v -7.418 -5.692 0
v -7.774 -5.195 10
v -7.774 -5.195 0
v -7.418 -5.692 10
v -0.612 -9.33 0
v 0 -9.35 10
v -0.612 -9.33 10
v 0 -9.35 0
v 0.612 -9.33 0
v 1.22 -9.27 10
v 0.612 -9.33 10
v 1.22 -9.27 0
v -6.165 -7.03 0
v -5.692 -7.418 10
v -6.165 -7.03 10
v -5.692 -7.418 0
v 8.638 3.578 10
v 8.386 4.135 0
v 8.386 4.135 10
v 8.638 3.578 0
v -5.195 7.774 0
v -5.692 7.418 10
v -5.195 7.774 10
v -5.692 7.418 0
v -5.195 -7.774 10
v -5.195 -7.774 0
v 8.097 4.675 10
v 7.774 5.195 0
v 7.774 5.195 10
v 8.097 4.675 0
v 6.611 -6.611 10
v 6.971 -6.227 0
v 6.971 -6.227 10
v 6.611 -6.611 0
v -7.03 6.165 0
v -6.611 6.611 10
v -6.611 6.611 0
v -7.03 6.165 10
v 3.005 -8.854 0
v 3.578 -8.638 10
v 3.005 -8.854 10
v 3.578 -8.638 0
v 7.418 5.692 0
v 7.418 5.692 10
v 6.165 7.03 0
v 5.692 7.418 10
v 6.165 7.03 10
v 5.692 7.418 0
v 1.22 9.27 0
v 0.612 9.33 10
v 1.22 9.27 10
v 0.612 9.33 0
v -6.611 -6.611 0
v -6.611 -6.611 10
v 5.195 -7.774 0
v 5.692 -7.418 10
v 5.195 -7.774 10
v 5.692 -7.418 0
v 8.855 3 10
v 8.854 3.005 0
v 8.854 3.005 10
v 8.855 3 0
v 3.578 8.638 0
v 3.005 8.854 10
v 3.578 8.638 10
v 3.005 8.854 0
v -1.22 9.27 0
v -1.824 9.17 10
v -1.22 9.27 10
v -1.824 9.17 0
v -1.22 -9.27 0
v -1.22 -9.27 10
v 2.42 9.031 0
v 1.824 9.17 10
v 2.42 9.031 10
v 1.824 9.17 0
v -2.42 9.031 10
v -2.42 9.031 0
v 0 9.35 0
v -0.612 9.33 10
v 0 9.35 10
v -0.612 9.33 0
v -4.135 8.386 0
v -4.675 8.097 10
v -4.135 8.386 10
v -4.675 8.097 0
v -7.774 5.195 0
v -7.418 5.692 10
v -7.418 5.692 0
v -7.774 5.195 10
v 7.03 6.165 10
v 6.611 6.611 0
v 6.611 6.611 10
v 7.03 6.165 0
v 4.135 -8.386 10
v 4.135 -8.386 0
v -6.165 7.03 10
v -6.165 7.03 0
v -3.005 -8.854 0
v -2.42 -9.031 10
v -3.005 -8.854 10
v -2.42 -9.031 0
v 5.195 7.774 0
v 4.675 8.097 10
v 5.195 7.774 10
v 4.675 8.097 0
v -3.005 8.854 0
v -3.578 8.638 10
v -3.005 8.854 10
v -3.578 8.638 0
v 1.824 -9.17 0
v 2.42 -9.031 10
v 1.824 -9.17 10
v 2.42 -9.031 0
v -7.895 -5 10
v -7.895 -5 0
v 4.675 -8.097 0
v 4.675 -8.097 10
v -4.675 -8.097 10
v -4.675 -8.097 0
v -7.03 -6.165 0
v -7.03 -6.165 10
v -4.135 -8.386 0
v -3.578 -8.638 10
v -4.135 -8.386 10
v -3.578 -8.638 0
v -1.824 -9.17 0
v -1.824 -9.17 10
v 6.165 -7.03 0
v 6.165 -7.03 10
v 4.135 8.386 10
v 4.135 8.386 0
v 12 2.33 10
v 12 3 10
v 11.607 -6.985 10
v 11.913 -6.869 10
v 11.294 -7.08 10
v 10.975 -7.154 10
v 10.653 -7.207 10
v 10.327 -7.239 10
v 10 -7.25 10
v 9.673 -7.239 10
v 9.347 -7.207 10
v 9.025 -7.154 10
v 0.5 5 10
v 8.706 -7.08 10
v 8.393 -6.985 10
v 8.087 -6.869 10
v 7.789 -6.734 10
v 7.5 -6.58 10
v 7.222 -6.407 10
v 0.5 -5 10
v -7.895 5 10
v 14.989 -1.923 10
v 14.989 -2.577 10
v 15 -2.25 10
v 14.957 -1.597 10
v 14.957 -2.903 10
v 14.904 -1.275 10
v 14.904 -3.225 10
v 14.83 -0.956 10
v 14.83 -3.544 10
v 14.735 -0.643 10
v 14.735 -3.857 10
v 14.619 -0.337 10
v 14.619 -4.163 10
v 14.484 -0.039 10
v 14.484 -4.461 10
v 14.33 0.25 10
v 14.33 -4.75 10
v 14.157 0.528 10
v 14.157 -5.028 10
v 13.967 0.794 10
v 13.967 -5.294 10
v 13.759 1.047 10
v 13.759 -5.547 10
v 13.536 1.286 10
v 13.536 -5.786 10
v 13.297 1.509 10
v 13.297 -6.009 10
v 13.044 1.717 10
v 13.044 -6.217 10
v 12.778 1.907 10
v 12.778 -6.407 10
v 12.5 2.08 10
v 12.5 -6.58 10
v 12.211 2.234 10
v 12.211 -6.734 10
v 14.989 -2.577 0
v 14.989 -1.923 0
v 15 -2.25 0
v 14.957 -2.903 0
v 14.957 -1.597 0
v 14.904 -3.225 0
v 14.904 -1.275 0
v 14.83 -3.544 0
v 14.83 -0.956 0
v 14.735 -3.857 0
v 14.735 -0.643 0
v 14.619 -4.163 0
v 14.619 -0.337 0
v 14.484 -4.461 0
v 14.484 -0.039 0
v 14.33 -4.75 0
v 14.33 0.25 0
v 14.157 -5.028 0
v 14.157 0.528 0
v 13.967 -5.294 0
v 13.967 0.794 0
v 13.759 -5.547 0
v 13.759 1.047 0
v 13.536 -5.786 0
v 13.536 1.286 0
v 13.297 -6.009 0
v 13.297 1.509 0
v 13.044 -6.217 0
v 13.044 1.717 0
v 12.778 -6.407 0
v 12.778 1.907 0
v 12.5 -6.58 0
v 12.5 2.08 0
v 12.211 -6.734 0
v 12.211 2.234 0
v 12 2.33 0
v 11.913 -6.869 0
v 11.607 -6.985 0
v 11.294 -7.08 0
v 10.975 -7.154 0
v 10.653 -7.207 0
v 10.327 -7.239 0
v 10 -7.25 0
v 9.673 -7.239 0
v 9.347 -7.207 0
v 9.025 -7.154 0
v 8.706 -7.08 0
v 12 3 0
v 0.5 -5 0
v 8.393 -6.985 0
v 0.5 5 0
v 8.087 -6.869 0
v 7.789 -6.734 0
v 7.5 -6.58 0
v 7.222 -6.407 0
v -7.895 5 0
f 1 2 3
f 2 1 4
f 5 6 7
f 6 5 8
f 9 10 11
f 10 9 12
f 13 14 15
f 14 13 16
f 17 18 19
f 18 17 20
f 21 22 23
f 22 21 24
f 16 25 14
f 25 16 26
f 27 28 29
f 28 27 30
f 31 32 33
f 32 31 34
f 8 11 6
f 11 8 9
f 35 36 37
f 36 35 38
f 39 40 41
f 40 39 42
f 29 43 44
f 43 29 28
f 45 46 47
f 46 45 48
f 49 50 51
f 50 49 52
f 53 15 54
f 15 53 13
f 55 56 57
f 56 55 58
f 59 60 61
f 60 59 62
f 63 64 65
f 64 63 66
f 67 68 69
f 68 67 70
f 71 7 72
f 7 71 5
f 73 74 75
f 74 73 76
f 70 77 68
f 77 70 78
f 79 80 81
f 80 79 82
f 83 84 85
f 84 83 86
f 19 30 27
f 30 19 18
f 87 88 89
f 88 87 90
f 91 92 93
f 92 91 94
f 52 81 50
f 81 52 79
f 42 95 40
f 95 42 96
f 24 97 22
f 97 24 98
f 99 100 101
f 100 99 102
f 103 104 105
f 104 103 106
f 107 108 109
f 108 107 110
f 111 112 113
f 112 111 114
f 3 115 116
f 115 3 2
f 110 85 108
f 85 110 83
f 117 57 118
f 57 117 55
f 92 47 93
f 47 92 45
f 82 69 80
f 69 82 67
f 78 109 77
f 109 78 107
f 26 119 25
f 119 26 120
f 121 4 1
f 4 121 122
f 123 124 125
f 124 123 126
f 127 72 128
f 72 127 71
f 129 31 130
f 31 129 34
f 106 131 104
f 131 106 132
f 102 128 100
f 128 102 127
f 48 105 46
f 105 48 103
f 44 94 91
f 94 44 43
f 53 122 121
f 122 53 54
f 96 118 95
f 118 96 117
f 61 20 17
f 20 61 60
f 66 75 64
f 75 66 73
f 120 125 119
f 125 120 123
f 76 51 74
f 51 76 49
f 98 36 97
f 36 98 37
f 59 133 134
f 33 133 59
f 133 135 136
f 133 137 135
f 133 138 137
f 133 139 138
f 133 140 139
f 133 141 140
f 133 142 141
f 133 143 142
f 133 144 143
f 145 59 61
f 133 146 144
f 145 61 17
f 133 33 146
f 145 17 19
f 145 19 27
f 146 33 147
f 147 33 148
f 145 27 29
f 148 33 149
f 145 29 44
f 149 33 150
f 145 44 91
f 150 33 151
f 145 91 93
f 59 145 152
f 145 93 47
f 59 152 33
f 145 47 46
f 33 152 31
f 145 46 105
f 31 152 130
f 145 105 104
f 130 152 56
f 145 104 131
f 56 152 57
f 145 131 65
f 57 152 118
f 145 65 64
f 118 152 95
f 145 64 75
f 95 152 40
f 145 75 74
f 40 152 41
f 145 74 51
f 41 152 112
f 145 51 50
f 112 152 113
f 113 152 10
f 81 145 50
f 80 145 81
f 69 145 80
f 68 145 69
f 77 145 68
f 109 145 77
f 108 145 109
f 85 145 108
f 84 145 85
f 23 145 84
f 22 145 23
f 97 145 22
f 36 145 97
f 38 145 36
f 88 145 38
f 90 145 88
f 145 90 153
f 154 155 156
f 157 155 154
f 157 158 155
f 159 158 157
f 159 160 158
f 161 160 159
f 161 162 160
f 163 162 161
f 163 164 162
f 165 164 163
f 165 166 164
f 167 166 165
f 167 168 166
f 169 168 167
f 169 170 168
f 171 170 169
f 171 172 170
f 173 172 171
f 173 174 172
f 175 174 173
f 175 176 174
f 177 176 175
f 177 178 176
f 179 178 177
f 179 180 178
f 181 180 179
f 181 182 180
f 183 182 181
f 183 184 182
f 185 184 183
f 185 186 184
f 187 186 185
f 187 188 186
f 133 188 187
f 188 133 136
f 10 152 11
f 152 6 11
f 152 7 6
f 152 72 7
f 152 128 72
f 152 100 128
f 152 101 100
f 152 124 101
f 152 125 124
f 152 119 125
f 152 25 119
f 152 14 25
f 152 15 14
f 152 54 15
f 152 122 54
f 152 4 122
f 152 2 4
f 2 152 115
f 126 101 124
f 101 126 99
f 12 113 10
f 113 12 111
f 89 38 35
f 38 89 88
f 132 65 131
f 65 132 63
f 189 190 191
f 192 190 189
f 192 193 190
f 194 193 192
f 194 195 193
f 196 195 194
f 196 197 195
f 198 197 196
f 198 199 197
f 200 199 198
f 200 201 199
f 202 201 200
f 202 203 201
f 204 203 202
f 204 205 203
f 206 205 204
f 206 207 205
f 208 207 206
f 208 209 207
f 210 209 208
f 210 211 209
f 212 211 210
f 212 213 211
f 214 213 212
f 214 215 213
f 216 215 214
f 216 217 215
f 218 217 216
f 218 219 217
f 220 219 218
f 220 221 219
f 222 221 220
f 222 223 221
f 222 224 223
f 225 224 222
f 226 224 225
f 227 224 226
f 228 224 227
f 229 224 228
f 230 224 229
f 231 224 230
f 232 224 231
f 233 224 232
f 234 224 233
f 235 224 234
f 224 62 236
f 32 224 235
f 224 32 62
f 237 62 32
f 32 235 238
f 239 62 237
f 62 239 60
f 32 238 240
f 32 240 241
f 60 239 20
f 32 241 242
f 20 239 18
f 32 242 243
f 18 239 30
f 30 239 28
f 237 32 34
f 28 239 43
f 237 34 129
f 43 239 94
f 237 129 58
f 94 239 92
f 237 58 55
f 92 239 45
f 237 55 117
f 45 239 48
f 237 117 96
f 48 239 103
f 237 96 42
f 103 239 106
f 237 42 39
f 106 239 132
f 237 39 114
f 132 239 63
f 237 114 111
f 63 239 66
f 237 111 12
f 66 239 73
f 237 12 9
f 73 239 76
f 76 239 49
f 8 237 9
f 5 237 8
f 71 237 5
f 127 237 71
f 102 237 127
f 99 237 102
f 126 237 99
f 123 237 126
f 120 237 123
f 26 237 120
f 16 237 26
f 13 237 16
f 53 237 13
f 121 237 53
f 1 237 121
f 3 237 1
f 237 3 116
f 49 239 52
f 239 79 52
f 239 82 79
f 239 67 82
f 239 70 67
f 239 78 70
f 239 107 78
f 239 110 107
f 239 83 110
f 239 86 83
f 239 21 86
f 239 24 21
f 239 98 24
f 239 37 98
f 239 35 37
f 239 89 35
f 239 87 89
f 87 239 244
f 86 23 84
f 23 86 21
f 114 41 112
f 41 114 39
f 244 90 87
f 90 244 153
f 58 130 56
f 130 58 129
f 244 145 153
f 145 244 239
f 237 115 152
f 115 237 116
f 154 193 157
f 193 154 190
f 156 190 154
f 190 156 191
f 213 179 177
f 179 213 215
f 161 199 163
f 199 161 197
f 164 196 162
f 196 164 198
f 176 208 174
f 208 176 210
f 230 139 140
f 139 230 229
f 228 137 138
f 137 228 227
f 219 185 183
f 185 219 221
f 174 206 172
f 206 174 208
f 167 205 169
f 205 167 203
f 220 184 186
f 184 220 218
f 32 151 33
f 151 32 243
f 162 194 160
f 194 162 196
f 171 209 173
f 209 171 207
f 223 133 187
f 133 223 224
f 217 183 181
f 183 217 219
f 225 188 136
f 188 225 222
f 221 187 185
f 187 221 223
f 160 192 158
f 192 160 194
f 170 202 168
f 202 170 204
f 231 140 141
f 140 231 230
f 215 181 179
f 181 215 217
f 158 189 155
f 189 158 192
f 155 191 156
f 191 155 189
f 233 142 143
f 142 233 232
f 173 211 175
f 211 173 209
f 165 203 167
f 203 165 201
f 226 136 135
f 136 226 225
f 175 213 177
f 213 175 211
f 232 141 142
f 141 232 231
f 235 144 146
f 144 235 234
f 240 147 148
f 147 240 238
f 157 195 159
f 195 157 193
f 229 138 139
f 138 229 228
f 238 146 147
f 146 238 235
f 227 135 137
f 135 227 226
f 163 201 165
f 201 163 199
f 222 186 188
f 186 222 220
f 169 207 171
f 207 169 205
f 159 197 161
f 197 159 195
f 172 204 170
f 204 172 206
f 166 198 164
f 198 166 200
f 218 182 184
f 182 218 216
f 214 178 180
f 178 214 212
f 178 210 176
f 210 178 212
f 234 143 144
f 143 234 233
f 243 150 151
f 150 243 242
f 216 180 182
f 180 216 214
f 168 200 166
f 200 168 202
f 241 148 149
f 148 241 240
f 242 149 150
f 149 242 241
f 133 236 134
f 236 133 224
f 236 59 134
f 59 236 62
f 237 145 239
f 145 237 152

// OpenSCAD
// Snap-on tubing clip for a 12.7 mm (1/2 inch) lab stand rod
// Printed flat: extrusion of 10 mm (Z) of a 2-D profile in XY
// Units: mm

$fn = 96;

// ---- Rod ring ----
rod_id     = 12.7;   // rod inner diameter
rod_wall   = 3;      // ring wall thickness
rod_od     = rod_id + 2 * rod_wall;  // 18.7 mm outer diameter
rod_h      = 10;     // extrusion height (Z)
rod_open   = 10;     // opening width cut from -X side
rod_ylim   = rod_open / 2;  // -5 < y < 5 for the cut

// ---- Tubing ring ----
tube_id    = 6;      // tubing inner diameter
tube_wall  = 2;      // ring wall thickness
tube_od    = tube_id + 2 * tube_wall; // 10 mm outer diameter
tube_h     = rod_h;  // same extrusion height
tube_open  = 4.5;    // opening width cut from +X side
tube_x     = 15;     // ring centre X
tube_ylim  = tube_open / 2;  // -2.25 < y < 2.25

// ---- Bridge ----
bridge_w   = 6;      // bridge width in Y
bridge_x0  = 8;      // bridge start X
bridge_x1  = 12;     // bridge end X

// ---- Cutting overlap ----
eps        = 0.5;    // extension past cut faces to avoid coplanar faces

difference() {
    union() {
        // Rod ring
        cylinder(d = rod_od, h = rod_h);
        translate([-rod_od / 2, -rod_ylim, 0])
            cube([rod_od / 2 + eps, 2 * rod_ylim, rod_h]);

        // Tubing ring
        translate([tube_x - tube_od / 2, -tube_ylim, 0])
            cylinder(d = tube_od, h = tube_h);
        translate([tube_x - tube_od / 2 + eps, -tube_ylim, 0])
            cube([eps, 2 * tube_ylim, tube_h]);

        // Solid bridge between the rings
        translate([bridge_x0, -bridge_w / 2, 0])
            cube([bridge_x1 - bridge_x0, bridge_w, rod_h]);
    }

    // Rod ring opening (x < 0 and -5 < y < 5)
    translate([-rod_od / 2, -rod_ylim, -eps])
        cube([rod_od / 2 + eps, 2 * rod_ylim, rod_h + 2 * eps]);

    // Tubing ring opening (x > 15 and -2.25 < y < 2.25)
    translate([tube_x, -tube_ylim, -eps])
        cube([eps + rod_h, 2 * tube_ylim, rod_h + 2 * eps]);
}
